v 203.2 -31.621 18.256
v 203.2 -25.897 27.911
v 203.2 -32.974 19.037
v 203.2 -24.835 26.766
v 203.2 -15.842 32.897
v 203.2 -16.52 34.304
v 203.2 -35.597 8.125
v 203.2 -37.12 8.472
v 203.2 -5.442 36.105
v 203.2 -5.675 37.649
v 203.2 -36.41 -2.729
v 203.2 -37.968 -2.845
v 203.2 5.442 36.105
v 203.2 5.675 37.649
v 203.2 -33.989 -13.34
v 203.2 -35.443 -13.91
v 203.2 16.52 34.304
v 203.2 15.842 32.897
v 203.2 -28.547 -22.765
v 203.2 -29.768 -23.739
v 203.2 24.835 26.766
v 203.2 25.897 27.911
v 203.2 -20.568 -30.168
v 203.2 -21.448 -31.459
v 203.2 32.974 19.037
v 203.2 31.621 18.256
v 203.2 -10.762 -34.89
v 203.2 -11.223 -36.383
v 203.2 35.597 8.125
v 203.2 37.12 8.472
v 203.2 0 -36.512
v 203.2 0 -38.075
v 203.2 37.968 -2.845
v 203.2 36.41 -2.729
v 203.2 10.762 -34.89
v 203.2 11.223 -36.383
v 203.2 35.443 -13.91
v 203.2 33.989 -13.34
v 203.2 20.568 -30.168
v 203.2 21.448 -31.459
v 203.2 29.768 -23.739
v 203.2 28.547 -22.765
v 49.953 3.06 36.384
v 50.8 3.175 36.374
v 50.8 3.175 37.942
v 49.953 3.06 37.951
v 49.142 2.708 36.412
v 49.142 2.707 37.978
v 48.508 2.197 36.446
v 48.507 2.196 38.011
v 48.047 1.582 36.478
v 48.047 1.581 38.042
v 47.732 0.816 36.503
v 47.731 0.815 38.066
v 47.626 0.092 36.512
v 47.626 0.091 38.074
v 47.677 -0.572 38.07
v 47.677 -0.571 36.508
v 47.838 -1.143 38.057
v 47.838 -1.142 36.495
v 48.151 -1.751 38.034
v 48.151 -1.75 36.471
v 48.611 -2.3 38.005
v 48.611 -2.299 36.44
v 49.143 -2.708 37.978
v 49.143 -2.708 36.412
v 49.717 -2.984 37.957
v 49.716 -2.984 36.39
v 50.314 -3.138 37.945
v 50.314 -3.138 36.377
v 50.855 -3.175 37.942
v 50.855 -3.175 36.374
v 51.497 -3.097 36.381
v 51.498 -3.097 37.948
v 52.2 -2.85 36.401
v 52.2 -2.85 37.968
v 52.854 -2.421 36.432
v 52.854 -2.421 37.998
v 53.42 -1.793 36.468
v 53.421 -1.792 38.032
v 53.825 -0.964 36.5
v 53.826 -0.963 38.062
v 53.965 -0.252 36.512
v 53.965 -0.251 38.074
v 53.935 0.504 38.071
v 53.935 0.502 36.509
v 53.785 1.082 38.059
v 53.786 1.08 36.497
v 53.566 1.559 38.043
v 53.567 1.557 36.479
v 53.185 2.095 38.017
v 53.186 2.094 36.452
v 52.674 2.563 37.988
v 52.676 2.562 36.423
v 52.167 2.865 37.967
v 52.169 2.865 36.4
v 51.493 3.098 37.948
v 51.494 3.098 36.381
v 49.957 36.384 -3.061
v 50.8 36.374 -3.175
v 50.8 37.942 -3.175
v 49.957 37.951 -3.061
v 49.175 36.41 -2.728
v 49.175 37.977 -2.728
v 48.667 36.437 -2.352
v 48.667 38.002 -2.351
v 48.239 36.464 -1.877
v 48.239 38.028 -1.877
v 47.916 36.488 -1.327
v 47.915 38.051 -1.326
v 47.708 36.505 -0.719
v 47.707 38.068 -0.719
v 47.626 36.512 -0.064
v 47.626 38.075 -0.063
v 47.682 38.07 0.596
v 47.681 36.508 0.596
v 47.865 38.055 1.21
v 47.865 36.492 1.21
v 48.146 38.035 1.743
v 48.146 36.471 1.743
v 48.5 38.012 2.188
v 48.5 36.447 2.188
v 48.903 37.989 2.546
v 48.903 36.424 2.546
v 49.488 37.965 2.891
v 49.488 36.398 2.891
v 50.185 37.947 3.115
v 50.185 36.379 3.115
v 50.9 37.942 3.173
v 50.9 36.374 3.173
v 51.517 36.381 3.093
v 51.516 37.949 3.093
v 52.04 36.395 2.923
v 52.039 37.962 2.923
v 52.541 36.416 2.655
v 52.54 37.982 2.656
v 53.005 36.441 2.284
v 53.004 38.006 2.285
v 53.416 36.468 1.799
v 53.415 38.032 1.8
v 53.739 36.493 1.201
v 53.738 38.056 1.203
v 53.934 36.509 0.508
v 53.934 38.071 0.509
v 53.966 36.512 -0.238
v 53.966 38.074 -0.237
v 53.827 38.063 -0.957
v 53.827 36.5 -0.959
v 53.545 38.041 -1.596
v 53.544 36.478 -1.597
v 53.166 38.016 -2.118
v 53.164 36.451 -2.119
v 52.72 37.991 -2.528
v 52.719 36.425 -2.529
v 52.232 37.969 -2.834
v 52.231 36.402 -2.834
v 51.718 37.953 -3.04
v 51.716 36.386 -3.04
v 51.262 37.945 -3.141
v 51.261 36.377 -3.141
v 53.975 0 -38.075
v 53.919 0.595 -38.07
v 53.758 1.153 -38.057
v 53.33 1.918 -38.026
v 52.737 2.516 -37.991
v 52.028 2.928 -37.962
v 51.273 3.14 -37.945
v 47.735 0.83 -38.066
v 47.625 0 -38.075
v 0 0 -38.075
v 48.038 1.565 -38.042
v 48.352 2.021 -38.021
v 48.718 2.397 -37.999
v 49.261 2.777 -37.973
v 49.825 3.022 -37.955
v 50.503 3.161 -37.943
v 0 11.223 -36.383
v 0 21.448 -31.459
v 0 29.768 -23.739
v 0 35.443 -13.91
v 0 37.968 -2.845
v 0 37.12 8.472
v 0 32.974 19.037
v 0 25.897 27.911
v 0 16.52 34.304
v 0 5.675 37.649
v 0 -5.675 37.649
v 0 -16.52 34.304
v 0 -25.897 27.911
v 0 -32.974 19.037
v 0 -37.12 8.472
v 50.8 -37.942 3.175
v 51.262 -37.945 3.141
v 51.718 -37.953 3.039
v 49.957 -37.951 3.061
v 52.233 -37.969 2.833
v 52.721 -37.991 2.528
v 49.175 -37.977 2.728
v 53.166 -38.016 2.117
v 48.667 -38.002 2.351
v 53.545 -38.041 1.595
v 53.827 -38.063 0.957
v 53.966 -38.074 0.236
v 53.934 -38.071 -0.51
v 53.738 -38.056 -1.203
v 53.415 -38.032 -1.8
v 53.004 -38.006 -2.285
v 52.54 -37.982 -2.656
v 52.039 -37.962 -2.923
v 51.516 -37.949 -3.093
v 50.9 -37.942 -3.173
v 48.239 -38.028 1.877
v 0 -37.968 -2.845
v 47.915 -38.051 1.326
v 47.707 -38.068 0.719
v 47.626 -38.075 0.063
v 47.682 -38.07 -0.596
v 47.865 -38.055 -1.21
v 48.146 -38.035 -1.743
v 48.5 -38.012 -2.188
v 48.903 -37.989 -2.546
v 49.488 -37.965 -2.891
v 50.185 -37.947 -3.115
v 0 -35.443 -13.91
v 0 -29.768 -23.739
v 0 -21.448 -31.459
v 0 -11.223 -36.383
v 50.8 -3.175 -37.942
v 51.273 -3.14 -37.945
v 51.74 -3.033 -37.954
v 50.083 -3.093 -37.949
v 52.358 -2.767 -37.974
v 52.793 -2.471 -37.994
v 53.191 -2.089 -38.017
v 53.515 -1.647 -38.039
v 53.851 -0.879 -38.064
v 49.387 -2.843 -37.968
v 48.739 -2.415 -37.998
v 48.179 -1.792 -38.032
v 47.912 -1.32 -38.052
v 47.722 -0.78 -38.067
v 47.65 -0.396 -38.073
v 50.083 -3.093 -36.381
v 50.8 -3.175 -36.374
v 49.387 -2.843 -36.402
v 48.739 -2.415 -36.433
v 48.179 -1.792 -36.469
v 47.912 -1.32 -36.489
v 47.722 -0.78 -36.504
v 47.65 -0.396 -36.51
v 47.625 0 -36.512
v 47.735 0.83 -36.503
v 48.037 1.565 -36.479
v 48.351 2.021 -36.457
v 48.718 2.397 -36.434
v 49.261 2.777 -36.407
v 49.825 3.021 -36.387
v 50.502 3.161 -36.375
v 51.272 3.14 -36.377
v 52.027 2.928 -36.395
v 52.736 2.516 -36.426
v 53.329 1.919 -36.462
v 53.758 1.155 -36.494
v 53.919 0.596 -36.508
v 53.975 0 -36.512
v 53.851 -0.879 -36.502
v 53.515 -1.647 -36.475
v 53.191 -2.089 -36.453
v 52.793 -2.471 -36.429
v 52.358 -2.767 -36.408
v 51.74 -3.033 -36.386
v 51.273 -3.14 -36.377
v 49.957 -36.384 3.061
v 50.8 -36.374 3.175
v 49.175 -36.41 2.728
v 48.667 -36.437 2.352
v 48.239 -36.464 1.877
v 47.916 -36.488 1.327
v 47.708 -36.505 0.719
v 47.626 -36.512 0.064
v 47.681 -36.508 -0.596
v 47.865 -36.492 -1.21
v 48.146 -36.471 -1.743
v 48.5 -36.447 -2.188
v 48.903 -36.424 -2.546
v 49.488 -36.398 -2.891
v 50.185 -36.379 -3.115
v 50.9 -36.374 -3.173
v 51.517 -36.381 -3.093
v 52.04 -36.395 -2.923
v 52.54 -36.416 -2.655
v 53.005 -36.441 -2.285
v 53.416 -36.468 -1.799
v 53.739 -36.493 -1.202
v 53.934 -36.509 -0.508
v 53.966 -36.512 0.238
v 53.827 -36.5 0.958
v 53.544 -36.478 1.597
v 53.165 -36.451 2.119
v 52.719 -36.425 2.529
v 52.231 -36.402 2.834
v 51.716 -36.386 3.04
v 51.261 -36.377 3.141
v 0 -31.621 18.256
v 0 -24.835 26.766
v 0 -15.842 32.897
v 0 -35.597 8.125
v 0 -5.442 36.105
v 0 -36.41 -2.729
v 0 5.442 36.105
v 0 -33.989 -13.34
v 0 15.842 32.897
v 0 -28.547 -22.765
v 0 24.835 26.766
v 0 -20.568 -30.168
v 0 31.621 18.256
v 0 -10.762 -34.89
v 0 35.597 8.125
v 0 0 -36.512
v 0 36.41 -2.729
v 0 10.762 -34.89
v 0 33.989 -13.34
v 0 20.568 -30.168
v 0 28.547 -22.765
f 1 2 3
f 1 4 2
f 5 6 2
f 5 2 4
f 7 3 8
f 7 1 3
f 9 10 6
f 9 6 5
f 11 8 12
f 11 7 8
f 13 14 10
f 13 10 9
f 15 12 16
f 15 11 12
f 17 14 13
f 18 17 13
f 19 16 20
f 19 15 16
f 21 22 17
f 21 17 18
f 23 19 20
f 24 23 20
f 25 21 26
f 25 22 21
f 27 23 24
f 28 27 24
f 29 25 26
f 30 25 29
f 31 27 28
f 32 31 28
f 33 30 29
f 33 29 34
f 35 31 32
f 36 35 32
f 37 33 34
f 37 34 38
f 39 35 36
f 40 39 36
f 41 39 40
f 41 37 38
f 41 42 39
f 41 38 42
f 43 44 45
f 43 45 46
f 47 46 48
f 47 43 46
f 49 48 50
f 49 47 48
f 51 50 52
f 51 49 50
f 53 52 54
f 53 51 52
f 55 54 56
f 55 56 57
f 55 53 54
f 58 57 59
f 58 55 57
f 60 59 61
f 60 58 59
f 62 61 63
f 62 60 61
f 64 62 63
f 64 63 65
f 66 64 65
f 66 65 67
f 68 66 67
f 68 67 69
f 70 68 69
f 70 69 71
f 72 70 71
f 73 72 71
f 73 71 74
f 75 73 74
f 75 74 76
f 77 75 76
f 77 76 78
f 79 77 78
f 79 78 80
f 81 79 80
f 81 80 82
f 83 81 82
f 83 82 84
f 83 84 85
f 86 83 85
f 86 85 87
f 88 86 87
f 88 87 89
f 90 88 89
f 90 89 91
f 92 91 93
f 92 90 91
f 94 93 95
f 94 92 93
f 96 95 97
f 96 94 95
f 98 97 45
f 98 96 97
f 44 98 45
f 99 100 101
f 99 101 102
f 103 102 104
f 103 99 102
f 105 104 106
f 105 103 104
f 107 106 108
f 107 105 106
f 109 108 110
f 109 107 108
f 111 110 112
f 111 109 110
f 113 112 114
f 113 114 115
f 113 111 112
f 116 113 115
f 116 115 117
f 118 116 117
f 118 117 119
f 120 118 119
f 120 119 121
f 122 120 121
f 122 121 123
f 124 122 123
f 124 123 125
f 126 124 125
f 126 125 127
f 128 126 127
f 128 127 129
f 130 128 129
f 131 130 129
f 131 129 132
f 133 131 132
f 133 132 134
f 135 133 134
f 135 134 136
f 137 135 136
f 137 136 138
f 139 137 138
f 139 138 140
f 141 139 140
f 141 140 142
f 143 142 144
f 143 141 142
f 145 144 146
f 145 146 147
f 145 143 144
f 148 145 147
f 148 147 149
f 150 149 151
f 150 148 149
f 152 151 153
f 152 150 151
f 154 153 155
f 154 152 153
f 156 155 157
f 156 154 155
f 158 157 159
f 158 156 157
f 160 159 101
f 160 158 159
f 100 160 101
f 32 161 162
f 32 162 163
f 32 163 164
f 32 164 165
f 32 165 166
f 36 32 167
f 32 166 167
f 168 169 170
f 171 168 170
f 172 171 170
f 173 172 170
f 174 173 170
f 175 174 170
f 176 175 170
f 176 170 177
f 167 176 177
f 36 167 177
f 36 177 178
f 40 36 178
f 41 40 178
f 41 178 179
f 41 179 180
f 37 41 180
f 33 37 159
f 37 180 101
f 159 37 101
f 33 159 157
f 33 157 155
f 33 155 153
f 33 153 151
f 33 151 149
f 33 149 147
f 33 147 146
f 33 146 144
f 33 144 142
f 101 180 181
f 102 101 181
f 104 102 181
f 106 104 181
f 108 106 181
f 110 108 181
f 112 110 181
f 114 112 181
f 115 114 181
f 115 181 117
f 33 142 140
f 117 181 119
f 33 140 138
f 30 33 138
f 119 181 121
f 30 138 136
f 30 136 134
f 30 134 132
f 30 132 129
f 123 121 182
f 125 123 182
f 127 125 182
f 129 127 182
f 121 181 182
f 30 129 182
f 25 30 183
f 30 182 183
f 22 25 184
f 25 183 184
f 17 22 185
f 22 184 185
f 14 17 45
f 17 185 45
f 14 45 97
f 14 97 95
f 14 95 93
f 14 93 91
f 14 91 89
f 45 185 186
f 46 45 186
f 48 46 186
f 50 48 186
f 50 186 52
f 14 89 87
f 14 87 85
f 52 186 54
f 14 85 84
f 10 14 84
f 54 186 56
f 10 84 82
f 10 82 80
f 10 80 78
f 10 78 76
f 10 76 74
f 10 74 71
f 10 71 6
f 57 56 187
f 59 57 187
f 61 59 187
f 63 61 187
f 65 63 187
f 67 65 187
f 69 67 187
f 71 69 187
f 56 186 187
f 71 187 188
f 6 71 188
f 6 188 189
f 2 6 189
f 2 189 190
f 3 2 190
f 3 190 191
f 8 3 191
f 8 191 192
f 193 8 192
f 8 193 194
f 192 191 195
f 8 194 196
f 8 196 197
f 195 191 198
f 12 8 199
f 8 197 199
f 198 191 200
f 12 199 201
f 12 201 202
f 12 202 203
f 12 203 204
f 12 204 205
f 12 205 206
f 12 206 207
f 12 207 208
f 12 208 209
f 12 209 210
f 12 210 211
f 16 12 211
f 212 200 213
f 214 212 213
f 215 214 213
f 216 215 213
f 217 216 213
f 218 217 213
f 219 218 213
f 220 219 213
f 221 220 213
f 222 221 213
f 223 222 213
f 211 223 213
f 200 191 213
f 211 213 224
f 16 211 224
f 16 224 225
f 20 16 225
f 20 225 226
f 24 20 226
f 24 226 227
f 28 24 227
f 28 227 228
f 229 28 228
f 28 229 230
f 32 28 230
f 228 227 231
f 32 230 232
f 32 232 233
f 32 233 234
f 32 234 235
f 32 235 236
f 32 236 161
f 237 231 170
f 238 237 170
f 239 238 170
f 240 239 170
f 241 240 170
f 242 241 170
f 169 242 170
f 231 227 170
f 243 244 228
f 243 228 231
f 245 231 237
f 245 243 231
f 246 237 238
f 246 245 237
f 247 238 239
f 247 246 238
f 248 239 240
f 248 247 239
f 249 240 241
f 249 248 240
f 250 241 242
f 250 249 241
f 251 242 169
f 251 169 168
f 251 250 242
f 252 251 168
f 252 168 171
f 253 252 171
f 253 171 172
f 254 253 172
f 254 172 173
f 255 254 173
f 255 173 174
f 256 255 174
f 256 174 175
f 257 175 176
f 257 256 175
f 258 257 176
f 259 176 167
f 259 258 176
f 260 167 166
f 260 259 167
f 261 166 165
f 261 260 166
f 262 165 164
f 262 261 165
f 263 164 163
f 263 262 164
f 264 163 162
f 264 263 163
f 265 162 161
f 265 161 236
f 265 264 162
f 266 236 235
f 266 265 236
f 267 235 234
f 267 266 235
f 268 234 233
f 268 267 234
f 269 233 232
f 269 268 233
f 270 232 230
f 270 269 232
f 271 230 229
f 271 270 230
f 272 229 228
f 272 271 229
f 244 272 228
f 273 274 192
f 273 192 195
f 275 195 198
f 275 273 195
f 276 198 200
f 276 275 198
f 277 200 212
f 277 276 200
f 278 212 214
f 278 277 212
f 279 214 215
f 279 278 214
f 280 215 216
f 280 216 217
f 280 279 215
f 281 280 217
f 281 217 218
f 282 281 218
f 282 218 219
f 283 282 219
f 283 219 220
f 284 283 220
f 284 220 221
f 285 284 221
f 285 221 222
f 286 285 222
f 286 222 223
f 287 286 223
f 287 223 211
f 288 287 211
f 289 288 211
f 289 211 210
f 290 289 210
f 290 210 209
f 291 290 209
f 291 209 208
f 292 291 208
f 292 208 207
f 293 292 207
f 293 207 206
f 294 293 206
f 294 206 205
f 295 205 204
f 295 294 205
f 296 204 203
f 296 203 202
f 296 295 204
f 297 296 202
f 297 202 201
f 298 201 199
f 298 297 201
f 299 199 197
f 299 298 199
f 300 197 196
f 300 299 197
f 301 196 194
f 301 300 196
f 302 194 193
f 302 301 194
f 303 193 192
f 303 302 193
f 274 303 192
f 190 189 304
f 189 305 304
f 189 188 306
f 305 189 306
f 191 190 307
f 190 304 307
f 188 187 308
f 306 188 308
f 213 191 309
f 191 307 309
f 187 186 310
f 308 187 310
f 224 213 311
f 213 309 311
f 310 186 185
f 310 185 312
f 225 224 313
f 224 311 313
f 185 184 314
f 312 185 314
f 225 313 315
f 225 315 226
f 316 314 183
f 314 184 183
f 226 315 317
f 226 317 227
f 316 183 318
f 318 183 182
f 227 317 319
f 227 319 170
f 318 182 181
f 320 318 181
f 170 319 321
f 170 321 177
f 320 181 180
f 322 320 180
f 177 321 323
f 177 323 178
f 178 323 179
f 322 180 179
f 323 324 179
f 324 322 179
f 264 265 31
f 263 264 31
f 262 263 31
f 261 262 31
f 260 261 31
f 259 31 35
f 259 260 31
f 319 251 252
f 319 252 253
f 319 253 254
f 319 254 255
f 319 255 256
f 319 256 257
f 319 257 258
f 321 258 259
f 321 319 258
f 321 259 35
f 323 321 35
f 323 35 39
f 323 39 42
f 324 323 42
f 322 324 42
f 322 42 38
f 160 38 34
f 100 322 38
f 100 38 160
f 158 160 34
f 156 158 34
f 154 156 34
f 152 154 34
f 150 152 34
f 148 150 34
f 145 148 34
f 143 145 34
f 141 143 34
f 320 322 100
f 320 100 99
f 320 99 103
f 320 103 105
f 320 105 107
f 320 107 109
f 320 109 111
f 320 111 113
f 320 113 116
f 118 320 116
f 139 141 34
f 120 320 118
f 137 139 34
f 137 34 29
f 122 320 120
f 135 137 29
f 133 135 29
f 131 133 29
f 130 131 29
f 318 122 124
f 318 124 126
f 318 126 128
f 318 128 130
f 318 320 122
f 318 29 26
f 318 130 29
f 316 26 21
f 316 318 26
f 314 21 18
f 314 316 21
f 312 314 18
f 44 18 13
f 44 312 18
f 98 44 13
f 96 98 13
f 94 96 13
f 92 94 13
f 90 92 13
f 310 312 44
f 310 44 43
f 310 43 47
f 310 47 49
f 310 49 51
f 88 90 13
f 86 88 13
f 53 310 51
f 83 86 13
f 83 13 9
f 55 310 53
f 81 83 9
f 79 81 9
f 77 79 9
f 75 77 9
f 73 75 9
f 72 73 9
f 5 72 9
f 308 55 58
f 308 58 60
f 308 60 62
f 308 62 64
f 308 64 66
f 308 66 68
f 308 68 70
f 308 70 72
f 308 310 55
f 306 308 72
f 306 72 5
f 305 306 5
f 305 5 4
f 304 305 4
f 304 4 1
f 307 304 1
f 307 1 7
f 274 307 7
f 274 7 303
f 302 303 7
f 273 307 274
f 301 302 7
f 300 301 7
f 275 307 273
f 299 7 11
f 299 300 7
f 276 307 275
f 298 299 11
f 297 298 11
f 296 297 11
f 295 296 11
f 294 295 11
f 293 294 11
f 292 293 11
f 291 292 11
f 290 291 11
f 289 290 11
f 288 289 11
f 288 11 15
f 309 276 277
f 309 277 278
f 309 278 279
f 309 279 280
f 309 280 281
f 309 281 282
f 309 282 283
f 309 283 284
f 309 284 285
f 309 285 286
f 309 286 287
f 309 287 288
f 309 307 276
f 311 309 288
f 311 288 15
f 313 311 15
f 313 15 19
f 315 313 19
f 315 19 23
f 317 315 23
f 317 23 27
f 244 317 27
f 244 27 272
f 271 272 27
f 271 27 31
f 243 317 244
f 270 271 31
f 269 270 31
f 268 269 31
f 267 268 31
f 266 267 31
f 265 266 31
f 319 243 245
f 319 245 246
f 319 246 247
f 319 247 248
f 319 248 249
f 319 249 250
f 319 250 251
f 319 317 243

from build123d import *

# Parameters (mm, degrees)
SKETCH1_R           = 38.0746
SKETCH1_R_2         = 36.5125
BOSS_EXTRUDE1_DEPTH = 203.2
SKETCH3_R           = 3.175
CUT_EXTRUDE1_DEPTH  = 211.213202084
CIRPATTERN1_COUNT   = 4


with BuildPart() as part:
    # Sketch1 → Boss-Extrude1 (new body)
    with BuildSketch(Plane.YZ):
        with Locations(Location((0, 0, 0), (0, 0, 270))):
            Circle(SKETCH1_R)
        with Locations(Location((0, 0, 0), (0, 0, 270))):
            Circle(SKETCH1_R_2, mode=Mode.SUBTRACT)
    extrude(amount=BOSS_EXTRUDE1_DEPTH)

    # Sketch3 → Cut-Extrude1 (cut, through all)
    with BuildSketch(Plane(origin=(0, 0, 0), x_dir=(-1, 0, 0), z_dir=(0, 1, 0))):
        with Locations(Location((-50.8, 0, 0), (0, 0, 270))):
            Circle(SKETCH3_R)
    cut_extrude1 = extrude(amount=CUT_EXTRUDE1_DEPTH, mode=Mode.SUBTRACT)

    # CirPattern1: Cut-Extrude1 ×4 about axis
    cirpattern1_axis = Axis((203.2, 0, 0), (-1, 0, 0))
    for i in range(1, CIRPATTERN1_COUNT):
        add(cut_extrude1.rotate(cirpattern1_axis, i * 360 / CIRPATTERN1_COUNT), mode=Mode.SUBTRACT)


solid = part.part
